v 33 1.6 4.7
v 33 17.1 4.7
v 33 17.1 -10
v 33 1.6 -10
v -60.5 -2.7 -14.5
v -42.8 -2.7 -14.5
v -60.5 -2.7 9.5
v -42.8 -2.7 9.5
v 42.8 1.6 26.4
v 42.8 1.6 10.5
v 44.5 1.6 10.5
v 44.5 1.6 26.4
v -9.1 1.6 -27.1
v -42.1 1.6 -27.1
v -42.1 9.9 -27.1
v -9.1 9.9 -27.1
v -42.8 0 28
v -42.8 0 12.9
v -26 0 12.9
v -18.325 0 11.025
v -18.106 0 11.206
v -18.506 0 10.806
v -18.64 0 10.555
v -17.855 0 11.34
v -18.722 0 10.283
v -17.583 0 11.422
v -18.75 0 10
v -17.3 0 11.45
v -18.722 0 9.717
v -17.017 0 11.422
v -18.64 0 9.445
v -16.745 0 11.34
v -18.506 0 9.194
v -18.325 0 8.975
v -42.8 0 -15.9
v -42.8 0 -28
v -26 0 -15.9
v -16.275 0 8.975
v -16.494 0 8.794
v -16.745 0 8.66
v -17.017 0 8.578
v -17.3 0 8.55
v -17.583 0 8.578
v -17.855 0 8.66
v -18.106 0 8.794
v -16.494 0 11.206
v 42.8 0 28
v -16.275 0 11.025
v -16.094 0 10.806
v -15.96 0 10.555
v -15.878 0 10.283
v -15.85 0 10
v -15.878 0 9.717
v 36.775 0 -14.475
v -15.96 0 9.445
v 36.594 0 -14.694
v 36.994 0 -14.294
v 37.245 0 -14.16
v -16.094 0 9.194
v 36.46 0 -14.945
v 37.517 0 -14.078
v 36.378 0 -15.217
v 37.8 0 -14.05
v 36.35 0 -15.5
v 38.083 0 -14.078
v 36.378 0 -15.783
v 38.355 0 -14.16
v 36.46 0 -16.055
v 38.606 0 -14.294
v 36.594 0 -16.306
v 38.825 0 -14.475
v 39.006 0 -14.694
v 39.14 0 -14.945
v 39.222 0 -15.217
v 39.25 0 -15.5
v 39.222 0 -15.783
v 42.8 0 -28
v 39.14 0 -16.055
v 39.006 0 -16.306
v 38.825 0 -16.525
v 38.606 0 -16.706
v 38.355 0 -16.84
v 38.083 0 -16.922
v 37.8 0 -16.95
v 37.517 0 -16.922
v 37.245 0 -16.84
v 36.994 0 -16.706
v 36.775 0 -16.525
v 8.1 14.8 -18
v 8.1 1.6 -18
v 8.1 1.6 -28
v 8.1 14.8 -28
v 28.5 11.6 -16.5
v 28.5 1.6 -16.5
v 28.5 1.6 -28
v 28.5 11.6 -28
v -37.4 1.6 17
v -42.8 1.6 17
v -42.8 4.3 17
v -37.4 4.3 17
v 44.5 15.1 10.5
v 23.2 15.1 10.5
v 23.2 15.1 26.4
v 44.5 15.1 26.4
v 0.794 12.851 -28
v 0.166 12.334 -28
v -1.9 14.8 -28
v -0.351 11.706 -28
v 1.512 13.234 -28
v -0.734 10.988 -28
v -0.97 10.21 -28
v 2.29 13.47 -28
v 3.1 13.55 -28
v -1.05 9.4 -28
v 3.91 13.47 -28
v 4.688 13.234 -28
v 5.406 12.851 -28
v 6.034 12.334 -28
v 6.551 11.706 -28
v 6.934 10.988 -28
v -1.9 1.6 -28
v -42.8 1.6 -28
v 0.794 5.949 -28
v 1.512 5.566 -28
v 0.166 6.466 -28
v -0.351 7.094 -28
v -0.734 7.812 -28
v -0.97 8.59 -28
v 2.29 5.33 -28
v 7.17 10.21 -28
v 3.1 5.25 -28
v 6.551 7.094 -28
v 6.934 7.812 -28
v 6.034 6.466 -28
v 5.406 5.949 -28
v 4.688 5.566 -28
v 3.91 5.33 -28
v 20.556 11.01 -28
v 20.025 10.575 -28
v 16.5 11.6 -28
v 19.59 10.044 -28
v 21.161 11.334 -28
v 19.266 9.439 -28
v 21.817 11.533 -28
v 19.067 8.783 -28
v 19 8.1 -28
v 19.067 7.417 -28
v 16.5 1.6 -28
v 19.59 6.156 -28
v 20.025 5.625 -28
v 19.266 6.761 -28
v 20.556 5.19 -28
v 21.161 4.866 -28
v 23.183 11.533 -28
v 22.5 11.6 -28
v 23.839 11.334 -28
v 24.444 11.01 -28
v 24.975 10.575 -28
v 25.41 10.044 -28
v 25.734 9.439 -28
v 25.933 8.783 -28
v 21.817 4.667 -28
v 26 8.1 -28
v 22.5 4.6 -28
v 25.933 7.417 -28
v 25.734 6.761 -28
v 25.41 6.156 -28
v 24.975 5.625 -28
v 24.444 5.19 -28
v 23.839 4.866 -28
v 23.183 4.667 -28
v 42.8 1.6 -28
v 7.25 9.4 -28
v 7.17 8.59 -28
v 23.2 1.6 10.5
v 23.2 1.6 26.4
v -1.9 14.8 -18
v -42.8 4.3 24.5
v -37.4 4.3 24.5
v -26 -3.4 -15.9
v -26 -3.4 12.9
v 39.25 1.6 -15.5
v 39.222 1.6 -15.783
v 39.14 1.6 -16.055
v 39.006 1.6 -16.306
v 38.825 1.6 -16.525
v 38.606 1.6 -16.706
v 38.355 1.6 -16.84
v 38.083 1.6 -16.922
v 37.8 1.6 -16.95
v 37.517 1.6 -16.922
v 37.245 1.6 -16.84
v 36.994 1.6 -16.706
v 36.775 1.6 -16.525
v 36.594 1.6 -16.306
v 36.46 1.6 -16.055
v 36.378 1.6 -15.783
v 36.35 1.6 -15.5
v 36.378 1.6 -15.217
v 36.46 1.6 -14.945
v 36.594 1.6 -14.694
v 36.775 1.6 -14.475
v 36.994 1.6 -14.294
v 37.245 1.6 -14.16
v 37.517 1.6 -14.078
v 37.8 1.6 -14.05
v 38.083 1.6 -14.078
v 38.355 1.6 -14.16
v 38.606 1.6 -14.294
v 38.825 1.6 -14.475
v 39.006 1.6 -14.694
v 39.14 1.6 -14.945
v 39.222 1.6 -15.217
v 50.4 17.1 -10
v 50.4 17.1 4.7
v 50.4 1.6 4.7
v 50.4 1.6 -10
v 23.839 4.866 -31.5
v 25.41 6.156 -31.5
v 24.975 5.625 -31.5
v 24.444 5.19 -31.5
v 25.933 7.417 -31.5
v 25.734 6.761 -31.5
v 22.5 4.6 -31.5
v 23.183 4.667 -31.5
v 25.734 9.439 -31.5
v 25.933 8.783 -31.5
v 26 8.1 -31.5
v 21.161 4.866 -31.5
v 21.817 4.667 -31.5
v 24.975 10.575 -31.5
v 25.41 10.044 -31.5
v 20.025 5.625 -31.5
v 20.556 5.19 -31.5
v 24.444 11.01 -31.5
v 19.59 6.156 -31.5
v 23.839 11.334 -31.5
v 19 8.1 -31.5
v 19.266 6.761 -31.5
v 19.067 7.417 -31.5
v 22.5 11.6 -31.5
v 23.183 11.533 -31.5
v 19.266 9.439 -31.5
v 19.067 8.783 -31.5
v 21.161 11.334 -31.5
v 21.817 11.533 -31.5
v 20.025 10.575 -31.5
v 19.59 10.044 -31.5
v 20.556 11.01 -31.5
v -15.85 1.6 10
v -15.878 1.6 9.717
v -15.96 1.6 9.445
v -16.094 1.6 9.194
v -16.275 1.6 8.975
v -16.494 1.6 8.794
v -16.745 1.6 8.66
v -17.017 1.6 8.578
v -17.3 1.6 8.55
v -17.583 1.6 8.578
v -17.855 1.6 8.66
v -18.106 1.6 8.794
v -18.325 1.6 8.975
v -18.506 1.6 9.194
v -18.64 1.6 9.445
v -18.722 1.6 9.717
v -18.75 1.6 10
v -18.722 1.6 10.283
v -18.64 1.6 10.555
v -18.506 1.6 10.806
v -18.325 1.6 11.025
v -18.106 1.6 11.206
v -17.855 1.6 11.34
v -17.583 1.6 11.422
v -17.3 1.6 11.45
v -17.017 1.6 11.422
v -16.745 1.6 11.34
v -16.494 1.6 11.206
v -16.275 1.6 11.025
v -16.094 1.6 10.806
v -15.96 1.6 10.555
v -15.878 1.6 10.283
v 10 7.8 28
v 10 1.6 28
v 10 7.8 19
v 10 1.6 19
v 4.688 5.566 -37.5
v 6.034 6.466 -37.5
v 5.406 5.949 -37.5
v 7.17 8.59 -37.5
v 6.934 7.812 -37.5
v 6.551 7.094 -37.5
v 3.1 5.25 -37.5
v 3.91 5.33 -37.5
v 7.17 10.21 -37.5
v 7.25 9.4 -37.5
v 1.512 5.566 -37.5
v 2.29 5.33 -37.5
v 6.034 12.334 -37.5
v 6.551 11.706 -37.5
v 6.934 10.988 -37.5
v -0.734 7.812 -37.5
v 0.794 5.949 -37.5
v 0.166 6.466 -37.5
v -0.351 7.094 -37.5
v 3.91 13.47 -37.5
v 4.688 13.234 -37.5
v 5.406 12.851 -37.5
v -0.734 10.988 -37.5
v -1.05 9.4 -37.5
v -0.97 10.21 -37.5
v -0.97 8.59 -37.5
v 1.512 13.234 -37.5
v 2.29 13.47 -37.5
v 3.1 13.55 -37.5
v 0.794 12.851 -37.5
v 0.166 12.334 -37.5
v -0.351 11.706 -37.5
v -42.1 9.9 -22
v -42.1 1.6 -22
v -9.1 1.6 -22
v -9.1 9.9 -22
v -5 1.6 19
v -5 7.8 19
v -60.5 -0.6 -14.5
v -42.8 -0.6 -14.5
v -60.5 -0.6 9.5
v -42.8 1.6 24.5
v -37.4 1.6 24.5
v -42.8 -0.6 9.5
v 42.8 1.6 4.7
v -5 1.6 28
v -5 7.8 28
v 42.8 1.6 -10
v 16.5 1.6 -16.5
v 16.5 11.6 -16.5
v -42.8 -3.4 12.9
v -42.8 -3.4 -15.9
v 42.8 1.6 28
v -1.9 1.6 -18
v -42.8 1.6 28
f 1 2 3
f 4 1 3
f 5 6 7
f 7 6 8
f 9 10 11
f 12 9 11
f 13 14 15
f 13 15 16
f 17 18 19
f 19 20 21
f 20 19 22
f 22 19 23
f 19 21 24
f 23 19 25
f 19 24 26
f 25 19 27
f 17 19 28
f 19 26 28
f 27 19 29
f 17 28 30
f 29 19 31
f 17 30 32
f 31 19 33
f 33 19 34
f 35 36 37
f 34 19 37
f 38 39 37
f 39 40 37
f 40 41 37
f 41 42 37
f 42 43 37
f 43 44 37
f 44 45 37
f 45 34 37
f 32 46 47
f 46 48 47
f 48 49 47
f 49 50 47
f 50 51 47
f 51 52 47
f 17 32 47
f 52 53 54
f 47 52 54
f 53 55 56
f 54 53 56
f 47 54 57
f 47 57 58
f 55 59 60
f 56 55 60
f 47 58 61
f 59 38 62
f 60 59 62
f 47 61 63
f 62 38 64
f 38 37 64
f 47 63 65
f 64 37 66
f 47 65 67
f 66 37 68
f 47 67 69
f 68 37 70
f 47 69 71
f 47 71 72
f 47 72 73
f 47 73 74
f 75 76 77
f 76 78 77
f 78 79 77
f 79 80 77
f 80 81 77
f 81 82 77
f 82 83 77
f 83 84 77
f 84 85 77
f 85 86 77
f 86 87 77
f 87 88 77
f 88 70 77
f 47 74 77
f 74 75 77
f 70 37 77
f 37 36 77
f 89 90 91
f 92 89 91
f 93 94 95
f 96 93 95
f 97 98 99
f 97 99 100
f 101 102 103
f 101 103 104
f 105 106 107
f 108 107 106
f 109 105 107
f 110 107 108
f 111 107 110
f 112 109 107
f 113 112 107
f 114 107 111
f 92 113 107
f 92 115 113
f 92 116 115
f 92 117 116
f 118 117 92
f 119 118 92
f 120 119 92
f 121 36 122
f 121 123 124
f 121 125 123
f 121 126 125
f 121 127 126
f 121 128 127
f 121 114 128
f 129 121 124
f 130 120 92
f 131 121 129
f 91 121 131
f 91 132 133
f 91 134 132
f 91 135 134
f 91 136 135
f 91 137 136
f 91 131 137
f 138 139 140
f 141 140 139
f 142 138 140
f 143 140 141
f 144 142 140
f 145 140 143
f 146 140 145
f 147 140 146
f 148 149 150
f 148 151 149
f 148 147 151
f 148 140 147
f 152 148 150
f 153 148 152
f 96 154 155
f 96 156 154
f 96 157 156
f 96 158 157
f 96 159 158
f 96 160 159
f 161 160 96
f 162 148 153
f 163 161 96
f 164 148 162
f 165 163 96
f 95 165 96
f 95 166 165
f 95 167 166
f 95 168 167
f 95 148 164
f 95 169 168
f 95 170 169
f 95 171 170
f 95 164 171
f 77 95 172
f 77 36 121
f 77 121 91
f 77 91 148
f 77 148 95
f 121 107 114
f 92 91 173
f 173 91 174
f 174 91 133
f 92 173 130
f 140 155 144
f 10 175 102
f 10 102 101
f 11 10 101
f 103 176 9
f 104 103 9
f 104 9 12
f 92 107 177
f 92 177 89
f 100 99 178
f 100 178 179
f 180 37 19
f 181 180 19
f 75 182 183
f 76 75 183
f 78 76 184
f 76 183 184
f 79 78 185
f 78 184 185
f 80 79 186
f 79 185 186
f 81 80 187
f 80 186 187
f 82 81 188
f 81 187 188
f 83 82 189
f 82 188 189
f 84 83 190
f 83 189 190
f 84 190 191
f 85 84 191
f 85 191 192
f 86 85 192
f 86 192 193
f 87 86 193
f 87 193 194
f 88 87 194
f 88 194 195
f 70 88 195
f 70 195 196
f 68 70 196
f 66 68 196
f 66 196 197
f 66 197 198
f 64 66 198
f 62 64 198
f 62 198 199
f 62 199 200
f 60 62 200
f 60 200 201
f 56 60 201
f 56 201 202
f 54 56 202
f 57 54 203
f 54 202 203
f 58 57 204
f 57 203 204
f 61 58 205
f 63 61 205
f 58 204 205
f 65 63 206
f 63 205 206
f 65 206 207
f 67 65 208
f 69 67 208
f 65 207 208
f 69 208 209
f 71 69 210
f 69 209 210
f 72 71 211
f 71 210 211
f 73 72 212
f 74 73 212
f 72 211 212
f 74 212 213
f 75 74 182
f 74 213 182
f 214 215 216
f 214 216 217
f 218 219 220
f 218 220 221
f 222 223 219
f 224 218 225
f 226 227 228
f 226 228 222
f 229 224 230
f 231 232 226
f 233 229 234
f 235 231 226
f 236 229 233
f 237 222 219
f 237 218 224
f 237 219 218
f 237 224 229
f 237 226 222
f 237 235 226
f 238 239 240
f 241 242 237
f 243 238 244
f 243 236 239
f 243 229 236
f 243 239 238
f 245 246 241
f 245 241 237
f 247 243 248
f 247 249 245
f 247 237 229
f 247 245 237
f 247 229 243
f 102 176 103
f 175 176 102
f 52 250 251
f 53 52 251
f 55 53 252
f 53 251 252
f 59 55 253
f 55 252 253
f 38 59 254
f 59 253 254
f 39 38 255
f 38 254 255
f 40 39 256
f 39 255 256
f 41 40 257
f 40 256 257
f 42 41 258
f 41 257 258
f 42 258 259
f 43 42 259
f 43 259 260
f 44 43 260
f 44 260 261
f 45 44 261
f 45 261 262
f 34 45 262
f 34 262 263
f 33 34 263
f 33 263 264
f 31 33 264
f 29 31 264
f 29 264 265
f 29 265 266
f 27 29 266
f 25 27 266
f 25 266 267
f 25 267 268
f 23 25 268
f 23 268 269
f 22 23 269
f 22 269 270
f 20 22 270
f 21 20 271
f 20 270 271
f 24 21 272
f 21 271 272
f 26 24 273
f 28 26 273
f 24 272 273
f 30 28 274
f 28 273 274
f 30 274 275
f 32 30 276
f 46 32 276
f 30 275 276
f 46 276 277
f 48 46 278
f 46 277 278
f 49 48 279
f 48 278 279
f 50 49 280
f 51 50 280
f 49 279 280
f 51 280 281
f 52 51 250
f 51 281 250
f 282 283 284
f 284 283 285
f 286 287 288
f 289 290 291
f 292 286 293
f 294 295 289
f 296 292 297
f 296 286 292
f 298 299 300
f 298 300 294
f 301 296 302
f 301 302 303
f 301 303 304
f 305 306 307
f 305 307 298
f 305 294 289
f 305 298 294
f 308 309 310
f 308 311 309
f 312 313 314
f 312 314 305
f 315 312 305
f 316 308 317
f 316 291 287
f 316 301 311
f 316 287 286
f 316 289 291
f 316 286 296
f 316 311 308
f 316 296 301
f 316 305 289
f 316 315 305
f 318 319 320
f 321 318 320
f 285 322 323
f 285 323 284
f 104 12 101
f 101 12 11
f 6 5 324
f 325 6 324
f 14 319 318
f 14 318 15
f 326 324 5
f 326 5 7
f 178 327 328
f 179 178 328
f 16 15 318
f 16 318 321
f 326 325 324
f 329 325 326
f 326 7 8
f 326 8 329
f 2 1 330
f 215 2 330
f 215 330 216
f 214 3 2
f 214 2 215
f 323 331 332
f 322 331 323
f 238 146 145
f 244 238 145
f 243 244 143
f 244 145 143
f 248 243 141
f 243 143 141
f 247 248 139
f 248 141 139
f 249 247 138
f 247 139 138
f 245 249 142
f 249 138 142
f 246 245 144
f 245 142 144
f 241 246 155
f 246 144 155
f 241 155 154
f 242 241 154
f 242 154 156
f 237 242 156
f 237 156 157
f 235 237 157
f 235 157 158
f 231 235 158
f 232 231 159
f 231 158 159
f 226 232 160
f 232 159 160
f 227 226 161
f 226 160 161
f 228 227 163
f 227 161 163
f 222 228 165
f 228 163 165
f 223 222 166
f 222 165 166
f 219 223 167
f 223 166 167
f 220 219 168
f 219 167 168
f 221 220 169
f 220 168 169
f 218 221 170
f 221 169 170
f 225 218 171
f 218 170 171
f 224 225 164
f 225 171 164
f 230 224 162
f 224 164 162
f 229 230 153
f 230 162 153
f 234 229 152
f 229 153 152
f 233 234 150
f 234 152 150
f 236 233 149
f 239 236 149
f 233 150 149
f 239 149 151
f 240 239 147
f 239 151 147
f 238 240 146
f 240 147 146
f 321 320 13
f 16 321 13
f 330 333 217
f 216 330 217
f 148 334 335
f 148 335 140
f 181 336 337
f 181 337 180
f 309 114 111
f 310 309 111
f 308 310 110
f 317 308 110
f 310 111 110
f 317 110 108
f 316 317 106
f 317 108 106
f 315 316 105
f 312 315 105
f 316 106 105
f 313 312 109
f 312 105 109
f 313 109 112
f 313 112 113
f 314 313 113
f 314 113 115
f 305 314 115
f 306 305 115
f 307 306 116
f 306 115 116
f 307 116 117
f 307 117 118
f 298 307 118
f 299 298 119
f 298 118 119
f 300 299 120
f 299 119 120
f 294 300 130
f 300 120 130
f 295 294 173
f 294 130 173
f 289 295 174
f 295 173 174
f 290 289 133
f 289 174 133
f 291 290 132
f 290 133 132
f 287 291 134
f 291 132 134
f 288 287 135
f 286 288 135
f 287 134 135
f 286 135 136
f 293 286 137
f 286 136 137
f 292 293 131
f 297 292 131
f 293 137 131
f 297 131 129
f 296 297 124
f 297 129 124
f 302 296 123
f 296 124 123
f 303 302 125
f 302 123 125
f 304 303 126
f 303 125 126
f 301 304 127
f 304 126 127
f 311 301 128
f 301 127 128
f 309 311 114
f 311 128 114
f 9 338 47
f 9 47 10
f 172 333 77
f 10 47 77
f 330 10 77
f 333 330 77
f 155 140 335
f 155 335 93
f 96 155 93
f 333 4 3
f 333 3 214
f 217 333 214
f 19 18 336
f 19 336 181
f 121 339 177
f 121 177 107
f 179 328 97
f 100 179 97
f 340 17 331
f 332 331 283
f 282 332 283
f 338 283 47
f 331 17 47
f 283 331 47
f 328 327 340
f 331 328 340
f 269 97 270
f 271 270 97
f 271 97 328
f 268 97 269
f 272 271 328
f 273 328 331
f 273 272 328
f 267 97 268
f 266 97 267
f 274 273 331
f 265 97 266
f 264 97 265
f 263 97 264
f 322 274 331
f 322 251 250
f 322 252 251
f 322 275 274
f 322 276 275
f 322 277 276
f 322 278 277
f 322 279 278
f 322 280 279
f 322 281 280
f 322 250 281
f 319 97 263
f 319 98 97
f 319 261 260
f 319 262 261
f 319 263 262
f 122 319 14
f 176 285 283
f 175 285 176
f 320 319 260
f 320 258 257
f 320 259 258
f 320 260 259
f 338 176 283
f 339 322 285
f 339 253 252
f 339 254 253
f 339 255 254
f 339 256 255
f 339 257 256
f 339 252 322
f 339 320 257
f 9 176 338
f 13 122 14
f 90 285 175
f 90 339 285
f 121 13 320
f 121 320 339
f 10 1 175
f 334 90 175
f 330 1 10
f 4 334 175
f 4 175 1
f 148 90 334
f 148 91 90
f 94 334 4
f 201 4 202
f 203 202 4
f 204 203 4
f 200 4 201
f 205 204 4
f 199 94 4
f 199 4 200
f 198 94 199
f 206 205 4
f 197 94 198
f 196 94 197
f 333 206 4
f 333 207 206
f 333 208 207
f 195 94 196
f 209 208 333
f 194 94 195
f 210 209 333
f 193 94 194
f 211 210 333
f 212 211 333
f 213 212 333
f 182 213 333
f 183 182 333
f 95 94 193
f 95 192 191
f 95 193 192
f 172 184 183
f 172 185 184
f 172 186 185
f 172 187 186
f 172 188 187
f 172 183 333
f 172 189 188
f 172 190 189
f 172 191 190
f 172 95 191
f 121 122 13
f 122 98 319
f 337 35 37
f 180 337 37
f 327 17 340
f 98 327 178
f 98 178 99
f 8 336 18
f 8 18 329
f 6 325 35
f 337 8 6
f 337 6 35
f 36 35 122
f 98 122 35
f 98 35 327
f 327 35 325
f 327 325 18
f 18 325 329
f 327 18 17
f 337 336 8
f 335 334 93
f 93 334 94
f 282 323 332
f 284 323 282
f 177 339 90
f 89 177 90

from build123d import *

# Parameters (mm, degrees)
SKETCH1_W            = 85.6
SKETCH1_H            = 56
BOSS_EXTRUDE1_DEPTH  = 1.6
SKETCH2_W            = 21.3
SKETCH2_H            = 15.9
BOSS_EXTRUDE2_DEPTH  = 13.5
SKETCH3_W            = 17.4
SKETCH3_H            = 14.7
BOSS_EXTRUDE3_DEPTH  = 15.5
SKETCH4_W            = 16.8
SKETCH4_H            = 28.8
BOSS_EXTRUDE4_DEPTH  = 3.4
SKETCH5_W            = 24
SKETCH5_H            = 2.1
BOSS_EXTRUDE5_DEPTH  = 17.7
SKETCH6_W            = 10
SKETCH6_H            = 10
BOSS_EXTRUDE6_DEPTH  = 13.2
SKETCH7_R            = 4.15
BOSS_EXTRUDE7_DEPTH  = 9.5
SKETCH8_W            = 12
SKETCH8_H            = 11.5
BOSS_EXTRUDE8_DEPTH  = 10
SKETCH9_R            = 3.5
BOSS_EXTRUDE9_DEPTH  = 3.5
SKETCH10_W           = 33
SKETCH10_H           = 5.1
BOSS_EXTRUDE10_DEPTH = 8.3
SKETCH11_W           = 5.4
SKETCH11_H           = 7.5
BOSS_EXTRUDE11_DEPTH = 2.7
SKETCH12_W           = 15
SKETCH12_H           = 9
BOSS_EXTRUDE12_DEPTH = 6.2
SKETCH13_R           = 1.45
CUT_EXTRUDE1_DEPTH   = 6


with BuildPart() as part:
    # Sketch1 → Boss-Extrude1 (new body)
    with BuildSketch(Plane(origin=(0, 0, 0), x_dir=(1, 0, 0), z_dir=(0, 1, 0))):
        Rectangle(SKETCH1_W, SKETCH1_H)
    extrude(amount=BOSS_EXTRUDE1_DEPTH)

    # Sketch2 → Boss-Extrude2 (add)
    with BuildSketch(Plane(origin=(0, 1.6, 0), x_dir=(1, 0, 0), z_dir=(0, 1, 0))):
        with Locations((33.85, -18.45)):
            Rectangle(SKETCH2_W, SKETCH2_H)
    extrude(amount=BOSS_EXTRUDE2_DEPTH)

    # Sketch3 → Boss-Extrude3 (add)
    with BuildSketch(Plane(origin=(0, 1.6, 0), x_dir=(1, 0, 0), z_dir=(0, 1, 0))):
        with Locations((41.7, 2.65)):
            Rectangle(SKETCH3_W, SKETCH3_H)
    extrude(amount=BOSS_EXTRUDE3_DEPTH)

    # Sketch4 → Boss-Extrude4 (add)
    with BuildSketch(Plane.XZ):
        with Locations((-34.4, -1.5)):
            Rectangle(SKETCH4_W, SKETCH4_H)
    extrude(amount=BOSS_EXTRUDE4_DEPTH)

    # Sketch5 → Boss-Extrude5 (add)
    with BuildSketch(Plane.ZY.offset(42.8)):
        with Locations((-2.5, -1.65)):
            Rectangle(SKETCH5_W, SKETCH5_H)
    extrude(amount=BOSS_EXTRUDE5_DEPTH)

    # Sketch6 → Boss-Extrude6 (add)
    with BuildSketch(Plane(origin=(0, 1.6, 0), x_dir=(1, 0, 0), z_dir=(0, 1, 0))):
        with Locations((3.1, 23)):
            Rectangle(SKETCH6_W, SKETCH6_H)
    extrude(amount=BOSS_EXTRUDE6_DEPTH)

    # Sketch7 → Boss-Extrude7 (add)
    with BuildSketch(Plane(origin=(0, 0, -28), x_dir=(-1, 0, 0), z_dir=(0, 0, -1))):
        with Locations((-3.1, 9.4)):
            Circle(SKETCH7_R)
    extrude(amount=BOSS_EXTRUDE7_DEPTH)

    # Sketch8 → Boss-Extrude8 (add)
    with BuildSketch(Plane(origin=(0, 1.6, 0), x_dir=(1, 0, 0), z_dir=(0, 1, 0))):
        with Locations((22.5, 22.25)):
            Rectangle(SKETCH8_W, SKETCH8_H)
    extrude(amount=BOSS_EXTRUDE8_DEPTH)

    # Sketch9 → Boss-Extrude9 (add)
    with BuildSketch(Plane(origin=(0, 0, -28), x_dir=(-1, 0, 0), z_dir=(0, 0, -1))):
        with Locations((-22.5, 8.1)):
            Circle(SKETCH9_R)
    extrude(amount=BOSS_EXTRUDE9_DEPTH)

    # Sketch10 → Boss-Extrude10 (add)
    with BuildSketch(Plane(origin=(0, 1.6, 0), x_dir=(1, 0, 0), z_dir=(0, 1, 0))):
        with Locations((-25.6, 24.55)):
            Rectangle(SKETCH10_W, SKETCH10_H)
    extrude(amount=BOSS_EXTRUDE10_DEPTH)

    # Sketch11 → Boss-Extrude11 (add)
    with BuildSketch(Plane(origin=(0, 1.6, 0), x_dir=(1, 0, 0), z_dir=(0, 1, 0))):
        with Locations((-40.1, -20.75)):
            Rectangle(SKETCH11_W, SKETCH11_H)
    extrude(amount=BOSS_EXTRUDE11_DEPTH)

    # Sketch12 → Boss-Extrude12 (add)
    with BuildSketch(Plane(origin=(0, 1.6, 0), x_dir=(1, 0, 0), z_dir=(0, 1, 0))):
        with Locations((2.5, -23.5)):
            Rectangle(SKETCH12_W, SKETCH12_H)
    extrude(amount=BOSS_EXTRUDE12_DEPTH)

    # Sketch13 → Cut-Extrude1 (cut, through all)
    with BuildSketch(Plane(origin=(0, 1.6, 0), x_dir=(1, 0, 0), z_dir=(0, 1, 0))):
        with Locations((-17.3, -10)):
            Circle(SKETCH13_R)
        with Locations((37.8, 15.5)):
            Circle(SKETCH13_R)
    extrude(amount=-CUT_EXTRUDE1_DEPTH, mode=Mode.SUBTRACT)


solid = part.part
